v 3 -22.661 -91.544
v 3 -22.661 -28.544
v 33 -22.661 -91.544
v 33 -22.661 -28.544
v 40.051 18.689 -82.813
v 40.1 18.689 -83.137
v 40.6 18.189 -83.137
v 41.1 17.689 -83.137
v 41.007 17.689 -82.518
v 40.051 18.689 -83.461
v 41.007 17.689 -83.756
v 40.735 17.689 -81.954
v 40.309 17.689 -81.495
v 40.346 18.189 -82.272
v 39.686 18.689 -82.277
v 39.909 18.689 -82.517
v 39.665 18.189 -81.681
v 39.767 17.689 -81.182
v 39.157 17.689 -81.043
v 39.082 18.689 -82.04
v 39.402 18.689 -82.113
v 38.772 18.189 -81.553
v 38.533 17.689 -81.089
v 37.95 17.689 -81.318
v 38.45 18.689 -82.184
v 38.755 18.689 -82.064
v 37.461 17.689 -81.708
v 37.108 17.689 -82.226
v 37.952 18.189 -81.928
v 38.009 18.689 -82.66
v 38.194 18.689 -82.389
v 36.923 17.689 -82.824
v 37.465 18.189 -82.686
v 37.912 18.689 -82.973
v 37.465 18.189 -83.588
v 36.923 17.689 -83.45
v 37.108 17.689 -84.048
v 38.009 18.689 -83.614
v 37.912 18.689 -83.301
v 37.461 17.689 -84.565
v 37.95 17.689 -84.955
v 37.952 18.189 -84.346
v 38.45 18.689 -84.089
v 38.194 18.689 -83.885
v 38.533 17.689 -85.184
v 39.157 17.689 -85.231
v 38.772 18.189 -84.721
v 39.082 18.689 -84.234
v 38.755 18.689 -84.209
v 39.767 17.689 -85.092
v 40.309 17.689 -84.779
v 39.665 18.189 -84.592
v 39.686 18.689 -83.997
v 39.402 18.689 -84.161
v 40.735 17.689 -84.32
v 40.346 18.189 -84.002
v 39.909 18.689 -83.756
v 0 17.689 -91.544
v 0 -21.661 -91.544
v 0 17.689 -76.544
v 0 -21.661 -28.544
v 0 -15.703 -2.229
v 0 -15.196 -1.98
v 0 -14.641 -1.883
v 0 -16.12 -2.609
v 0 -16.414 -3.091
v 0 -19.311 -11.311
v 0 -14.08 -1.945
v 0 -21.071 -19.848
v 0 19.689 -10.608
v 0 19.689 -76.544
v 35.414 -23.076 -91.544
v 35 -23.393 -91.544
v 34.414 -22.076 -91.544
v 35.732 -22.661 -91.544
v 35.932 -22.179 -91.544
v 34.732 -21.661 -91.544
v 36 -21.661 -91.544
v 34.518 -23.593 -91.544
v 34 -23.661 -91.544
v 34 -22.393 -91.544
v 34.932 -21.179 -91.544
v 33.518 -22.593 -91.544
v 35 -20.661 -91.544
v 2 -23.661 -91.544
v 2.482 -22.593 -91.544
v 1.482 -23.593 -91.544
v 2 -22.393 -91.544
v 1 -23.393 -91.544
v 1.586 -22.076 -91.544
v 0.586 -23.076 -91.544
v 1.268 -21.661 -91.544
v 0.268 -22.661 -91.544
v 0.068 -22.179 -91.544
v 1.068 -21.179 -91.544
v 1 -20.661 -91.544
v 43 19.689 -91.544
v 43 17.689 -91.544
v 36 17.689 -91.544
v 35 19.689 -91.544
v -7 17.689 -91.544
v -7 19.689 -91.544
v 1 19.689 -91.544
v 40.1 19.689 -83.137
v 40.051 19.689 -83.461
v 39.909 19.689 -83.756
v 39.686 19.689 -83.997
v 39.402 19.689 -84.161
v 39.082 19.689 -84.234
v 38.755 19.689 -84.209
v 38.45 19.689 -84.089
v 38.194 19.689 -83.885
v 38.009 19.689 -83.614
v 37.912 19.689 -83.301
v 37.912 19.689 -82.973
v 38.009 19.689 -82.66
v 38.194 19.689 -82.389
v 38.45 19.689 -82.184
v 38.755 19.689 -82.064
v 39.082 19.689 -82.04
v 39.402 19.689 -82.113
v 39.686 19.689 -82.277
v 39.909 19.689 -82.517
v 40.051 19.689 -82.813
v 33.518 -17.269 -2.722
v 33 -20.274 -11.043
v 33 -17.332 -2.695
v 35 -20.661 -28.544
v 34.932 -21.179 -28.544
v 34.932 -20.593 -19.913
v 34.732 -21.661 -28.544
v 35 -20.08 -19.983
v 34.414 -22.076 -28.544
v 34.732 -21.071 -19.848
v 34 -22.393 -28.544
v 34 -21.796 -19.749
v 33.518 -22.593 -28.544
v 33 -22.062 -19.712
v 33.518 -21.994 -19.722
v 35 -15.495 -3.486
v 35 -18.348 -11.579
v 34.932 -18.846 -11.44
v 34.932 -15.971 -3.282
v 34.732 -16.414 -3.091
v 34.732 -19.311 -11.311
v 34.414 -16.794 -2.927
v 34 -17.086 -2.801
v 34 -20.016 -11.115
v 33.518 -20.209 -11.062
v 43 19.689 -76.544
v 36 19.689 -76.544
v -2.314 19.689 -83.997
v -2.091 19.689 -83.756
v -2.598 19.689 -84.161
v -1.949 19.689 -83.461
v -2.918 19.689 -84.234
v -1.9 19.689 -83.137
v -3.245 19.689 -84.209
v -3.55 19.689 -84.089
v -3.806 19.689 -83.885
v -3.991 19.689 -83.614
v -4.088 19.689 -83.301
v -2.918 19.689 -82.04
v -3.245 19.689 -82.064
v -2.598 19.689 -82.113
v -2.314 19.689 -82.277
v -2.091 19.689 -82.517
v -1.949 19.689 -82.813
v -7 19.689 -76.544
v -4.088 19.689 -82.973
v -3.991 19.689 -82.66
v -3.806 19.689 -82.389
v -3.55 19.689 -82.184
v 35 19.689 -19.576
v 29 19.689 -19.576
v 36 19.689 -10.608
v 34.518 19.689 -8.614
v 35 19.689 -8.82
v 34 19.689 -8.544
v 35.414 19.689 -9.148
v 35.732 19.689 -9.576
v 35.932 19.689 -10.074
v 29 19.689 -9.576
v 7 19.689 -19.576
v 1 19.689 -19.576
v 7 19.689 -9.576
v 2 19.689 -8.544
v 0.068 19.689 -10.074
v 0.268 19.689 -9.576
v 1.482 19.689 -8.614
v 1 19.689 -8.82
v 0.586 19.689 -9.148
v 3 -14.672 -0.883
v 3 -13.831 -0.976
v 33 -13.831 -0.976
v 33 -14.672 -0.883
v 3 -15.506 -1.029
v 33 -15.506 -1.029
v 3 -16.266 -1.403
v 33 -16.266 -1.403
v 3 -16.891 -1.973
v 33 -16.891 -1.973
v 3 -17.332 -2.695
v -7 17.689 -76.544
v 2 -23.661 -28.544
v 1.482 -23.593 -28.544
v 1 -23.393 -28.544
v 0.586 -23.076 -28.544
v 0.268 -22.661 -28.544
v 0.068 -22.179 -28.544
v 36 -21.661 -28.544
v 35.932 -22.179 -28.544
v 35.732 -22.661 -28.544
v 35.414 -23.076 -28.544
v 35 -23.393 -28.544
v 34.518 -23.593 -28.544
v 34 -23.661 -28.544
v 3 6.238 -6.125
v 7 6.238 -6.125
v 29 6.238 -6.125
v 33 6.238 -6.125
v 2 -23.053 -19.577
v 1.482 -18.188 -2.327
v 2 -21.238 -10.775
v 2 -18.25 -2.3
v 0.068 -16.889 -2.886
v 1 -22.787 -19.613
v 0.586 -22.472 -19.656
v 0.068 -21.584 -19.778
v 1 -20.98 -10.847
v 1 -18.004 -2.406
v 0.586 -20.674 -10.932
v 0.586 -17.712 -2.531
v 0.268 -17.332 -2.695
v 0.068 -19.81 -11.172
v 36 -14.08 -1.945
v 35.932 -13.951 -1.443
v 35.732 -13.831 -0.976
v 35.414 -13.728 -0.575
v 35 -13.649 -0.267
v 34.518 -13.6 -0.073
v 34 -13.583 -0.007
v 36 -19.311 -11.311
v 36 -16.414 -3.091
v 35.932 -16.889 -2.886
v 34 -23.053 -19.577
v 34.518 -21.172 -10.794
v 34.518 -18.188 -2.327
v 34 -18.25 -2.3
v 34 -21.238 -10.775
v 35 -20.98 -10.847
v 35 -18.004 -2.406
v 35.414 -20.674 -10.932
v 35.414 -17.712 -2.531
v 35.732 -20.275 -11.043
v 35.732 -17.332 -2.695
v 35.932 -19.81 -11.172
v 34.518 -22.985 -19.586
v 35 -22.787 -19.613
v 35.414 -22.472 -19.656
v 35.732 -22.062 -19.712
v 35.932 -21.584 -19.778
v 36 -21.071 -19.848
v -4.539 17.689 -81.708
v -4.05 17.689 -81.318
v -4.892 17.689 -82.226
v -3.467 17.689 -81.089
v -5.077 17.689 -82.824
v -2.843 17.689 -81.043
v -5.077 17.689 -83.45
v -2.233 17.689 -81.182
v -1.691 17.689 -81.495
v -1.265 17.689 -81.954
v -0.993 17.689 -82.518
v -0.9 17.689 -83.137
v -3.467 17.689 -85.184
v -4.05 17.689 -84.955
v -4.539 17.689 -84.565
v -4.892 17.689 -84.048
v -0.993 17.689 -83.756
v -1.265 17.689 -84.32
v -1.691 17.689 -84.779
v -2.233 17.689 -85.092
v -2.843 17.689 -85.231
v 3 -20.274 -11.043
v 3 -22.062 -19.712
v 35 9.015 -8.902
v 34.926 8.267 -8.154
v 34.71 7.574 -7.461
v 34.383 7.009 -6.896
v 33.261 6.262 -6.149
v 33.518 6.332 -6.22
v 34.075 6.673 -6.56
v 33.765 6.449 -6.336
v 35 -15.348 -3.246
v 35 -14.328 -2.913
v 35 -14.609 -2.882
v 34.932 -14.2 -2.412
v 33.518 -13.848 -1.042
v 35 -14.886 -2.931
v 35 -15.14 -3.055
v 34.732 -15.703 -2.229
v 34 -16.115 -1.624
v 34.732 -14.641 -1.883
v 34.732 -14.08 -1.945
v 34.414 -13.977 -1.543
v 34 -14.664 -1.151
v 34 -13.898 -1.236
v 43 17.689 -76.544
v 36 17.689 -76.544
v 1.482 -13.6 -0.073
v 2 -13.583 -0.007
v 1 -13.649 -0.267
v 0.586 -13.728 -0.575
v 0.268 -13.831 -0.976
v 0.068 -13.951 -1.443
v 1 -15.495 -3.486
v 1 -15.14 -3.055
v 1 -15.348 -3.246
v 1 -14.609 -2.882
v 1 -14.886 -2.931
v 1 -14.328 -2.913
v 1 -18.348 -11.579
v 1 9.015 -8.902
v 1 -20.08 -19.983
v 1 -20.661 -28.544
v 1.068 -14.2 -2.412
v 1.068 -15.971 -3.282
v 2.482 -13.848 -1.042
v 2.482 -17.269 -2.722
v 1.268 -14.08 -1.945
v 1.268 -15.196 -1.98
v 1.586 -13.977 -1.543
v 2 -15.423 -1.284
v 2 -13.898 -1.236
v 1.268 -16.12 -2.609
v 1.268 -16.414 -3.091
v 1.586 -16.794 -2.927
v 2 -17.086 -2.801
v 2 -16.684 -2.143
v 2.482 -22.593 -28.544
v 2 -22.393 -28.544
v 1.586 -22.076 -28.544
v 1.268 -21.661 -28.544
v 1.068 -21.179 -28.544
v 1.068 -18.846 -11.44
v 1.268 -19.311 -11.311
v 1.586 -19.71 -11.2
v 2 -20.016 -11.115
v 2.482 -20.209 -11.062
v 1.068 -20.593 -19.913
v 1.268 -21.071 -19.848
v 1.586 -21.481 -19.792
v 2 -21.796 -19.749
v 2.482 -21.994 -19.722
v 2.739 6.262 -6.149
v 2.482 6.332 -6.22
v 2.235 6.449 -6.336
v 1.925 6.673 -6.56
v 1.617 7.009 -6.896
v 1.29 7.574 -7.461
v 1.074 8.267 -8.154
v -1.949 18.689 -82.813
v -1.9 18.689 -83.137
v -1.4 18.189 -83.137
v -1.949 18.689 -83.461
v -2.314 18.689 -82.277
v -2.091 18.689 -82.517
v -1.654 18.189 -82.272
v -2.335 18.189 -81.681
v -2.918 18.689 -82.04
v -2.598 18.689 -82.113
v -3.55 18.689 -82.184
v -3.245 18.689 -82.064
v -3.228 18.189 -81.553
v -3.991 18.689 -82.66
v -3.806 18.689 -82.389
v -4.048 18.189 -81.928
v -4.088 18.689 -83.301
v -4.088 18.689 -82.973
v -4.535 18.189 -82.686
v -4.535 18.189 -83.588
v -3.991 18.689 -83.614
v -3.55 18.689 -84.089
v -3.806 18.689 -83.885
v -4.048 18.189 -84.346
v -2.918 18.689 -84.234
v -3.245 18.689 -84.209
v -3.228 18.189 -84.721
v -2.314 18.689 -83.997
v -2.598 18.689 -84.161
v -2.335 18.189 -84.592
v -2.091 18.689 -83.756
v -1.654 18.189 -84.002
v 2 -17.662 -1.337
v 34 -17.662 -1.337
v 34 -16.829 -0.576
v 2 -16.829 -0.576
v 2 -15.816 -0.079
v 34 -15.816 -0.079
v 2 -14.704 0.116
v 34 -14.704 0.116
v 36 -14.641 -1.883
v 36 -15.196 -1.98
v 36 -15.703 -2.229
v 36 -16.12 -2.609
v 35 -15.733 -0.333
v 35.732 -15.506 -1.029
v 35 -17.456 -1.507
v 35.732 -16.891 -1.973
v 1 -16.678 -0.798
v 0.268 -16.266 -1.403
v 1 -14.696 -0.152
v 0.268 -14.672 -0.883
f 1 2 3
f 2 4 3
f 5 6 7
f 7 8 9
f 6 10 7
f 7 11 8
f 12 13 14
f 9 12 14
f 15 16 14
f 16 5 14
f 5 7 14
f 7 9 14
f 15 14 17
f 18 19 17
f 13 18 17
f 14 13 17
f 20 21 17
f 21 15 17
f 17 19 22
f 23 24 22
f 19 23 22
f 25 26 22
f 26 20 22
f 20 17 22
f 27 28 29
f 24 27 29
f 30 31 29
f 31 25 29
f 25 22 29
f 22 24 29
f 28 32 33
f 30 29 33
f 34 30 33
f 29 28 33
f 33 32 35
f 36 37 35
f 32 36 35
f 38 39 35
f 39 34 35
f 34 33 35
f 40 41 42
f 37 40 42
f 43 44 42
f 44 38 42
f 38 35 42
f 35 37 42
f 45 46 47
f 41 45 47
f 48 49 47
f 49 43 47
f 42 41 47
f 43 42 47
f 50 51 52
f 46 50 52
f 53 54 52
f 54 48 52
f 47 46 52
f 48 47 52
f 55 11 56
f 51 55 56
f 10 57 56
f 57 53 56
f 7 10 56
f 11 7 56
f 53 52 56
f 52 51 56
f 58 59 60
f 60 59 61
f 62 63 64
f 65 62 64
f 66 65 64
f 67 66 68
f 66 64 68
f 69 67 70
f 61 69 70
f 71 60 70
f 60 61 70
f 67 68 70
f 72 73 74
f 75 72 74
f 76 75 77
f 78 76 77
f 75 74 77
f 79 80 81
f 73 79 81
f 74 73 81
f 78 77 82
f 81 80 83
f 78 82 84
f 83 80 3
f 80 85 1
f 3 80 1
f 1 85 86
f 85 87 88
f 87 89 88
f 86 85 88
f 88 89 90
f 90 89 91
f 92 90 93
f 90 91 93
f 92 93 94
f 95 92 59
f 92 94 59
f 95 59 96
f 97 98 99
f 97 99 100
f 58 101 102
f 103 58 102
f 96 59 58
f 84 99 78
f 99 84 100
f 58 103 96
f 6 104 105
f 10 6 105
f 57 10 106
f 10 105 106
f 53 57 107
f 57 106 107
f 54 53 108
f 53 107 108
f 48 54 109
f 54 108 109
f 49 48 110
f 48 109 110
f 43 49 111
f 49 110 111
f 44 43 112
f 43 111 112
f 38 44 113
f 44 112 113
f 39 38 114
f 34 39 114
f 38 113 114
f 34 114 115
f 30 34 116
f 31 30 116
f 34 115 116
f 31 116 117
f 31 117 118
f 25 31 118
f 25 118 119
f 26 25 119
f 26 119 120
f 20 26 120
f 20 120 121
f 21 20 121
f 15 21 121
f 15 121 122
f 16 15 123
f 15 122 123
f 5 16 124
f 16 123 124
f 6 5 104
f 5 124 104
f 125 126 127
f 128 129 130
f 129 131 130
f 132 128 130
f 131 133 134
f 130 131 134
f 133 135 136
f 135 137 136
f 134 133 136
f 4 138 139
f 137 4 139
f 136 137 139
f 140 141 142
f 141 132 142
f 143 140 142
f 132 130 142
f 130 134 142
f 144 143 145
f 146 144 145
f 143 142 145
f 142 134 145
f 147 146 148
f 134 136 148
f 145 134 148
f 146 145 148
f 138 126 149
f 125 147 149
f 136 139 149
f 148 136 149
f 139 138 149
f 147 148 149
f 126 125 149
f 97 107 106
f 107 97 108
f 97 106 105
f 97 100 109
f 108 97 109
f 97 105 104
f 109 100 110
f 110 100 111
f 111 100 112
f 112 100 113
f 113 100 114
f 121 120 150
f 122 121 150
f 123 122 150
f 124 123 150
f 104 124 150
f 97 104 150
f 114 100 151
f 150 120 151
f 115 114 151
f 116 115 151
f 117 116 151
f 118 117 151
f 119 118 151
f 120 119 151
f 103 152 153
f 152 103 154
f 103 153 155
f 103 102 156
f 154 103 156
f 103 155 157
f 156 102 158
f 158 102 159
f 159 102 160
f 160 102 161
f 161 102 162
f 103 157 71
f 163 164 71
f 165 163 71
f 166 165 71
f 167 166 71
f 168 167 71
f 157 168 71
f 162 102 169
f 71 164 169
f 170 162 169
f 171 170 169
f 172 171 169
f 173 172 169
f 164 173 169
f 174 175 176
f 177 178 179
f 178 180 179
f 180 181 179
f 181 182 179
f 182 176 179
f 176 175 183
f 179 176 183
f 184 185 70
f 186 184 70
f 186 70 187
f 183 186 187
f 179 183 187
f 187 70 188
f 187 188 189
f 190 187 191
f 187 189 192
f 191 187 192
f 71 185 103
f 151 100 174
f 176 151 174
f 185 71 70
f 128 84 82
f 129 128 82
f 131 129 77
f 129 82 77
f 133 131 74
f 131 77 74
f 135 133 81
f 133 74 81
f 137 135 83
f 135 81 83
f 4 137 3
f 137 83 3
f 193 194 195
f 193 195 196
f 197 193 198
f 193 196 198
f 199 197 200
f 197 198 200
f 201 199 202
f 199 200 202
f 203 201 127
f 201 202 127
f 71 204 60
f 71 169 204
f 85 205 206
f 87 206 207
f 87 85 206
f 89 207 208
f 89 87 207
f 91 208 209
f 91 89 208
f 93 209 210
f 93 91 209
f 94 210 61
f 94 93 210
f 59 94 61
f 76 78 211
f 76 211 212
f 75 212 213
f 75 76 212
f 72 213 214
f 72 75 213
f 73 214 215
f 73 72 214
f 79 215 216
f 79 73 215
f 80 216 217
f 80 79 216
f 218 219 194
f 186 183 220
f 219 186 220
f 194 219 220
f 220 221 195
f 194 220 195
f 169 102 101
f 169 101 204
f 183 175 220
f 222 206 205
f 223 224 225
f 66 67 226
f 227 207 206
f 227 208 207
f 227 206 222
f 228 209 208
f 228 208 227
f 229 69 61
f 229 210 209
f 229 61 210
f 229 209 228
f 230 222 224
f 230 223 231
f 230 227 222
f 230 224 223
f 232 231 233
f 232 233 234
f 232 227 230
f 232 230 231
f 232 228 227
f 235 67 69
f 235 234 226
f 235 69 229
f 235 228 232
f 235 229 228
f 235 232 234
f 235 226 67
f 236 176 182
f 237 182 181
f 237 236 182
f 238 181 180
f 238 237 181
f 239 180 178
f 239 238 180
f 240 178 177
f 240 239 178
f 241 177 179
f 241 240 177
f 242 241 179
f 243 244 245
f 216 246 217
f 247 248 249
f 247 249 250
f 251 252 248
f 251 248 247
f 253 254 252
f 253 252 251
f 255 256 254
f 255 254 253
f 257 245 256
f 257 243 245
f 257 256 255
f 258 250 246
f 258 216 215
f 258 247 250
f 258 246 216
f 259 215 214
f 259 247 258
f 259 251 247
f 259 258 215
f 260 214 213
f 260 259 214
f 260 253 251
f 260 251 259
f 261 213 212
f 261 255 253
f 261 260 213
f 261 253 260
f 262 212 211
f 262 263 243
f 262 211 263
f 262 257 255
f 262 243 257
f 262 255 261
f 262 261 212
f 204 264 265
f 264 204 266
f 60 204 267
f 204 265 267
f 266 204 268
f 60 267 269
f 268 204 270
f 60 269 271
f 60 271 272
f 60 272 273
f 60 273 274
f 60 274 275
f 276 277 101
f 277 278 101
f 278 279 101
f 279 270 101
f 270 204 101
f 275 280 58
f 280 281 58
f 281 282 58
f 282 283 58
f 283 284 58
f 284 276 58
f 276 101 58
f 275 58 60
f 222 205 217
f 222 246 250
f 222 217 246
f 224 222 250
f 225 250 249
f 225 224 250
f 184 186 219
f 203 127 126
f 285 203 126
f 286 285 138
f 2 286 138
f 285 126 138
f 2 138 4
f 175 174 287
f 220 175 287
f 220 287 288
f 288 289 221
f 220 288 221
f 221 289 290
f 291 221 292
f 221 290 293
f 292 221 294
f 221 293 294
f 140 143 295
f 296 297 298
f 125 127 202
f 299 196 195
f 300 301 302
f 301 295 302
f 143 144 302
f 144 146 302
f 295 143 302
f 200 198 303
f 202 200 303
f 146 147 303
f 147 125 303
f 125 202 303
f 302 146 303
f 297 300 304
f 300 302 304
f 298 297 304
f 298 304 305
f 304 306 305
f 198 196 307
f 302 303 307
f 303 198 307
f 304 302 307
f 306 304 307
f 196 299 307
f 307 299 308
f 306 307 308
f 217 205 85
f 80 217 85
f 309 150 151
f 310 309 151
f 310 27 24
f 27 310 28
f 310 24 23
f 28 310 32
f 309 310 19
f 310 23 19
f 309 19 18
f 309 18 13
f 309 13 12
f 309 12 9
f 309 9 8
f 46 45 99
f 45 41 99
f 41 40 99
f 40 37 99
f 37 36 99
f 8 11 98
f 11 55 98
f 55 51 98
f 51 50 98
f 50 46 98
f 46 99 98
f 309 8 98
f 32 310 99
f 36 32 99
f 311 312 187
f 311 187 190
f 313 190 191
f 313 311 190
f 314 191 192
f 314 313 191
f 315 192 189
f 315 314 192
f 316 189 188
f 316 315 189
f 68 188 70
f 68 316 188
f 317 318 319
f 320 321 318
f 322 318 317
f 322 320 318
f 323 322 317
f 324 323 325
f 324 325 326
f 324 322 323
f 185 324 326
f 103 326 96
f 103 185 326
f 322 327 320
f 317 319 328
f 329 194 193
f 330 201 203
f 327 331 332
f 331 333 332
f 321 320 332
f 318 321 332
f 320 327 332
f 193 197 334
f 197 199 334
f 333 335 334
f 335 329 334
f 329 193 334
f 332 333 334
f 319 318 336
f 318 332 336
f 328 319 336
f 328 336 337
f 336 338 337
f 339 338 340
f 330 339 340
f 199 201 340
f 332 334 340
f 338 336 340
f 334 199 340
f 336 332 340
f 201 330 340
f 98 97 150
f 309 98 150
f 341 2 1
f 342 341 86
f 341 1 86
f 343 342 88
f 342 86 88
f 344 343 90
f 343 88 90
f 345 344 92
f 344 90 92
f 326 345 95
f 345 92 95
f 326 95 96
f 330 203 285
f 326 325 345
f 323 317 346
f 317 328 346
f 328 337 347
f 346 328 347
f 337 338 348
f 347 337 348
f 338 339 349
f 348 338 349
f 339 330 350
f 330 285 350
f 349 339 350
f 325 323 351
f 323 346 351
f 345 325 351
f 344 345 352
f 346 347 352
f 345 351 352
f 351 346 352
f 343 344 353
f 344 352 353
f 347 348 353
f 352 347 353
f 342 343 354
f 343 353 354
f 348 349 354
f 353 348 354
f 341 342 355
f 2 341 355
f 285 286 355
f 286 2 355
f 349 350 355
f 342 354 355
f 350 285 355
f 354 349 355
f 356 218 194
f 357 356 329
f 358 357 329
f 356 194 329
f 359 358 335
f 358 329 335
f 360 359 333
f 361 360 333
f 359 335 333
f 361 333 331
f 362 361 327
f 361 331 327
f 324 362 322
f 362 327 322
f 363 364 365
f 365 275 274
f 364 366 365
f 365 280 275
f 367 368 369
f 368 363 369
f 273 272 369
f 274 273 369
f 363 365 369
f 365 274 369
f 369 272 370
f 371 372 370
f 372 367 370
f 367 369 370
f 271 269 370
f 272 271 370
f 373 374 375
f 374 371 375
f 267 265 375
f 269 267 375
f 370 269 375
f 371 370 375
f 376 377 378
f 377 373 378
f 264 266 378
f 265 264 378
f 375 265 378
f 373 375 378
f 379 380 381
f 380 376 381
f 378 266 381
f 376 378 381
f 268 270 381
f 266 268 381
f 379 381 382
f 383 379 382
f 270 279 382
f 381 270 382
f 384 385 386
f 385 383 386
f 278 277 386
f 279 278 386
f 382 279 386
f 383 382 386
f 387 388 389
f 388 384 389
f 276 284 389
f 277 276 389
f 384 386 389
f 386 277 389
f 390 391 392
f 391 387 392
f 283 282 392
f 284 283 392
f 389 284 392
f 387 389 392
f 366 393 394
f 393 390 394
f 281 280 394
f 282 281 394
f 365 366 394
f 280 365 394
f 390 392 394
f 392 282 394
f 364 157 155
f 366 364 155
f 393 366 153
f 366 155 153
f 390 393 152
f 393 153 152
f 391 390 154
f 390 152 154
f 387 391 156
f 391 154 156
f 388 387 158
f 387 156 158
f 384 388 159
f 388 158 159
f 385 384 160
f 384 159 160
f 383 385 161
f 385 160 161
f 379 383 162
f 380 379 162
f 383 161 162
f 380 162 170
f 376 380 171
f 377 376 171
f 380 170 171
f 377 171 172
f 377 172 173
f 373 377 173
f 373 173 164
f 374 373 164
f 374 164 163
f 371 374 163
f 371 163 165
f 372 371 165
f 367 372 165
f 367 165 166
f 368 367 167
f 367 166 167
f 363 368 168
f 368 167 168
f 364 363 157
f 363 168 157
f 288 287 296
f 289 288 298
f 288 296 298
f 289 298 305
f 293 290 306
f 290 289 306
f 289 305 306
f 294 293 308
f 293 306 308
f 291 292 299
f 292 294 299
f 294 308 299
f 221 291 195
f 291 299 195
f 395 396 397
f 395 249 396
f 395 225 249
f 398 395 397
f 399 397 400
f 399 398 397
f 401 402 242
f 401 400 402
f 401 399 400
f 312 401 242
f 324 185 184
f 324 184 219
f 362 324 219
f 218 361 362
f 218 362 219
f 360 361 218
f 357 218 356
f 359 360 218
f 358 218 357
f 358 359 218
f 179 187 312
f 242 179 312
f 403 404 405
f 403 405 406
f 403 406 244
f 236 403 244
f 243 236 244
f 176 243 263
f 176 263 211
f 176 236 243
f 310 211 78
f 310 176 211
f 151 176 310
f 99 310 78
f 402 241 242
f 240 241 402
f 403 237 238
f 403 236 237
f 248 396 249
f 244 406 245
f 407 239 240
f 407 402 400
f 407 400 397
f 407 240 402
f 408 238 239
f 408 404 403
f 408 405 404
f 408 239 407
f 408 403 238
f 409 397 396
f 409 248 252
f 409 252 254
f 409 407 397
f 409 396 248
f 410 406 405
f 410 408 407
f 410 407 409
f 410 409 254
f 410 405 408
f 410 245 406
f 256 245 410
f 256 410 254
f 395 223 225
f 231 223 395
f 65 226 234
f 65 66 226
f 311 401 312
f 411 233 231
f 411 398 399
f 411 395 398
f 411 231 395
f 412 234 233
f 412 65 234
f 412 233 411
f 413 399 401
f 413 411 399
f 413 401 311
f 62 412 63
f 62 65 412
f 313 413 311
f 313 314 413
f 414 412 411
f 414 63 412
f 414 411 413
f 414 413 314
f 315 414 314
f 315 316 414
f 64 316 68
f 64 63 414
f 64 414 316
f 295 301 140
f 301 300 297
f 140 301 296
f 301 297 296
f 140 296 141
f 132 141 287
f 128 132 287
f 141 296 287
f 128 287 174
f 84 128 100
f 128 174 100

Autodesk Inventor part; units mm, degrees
ref_plane "YZ Plane" through (0, 0, 0) normal (1, 0, 0) x (0, 1, 0)
ref_plane "XZ Plane" through (0, 0, 0) normal (0, 1, 0) x (-1, 0, 0)
ref_plane "XY Plane" through (0, 0, 0) normal (0, 0, 1) x (1, 0, 0)
sketch "Skizze1" plane through (0, 0, 0) normal (1, 0, 0) x (0, 1, 0)
  line L0 (19.6888, -8.5435) -> (-13.5827, -0.0073)
  arc A0 (-13.5827, -0.0073) -> (-18.2505, -2.2997) centre (-14.5767, -3.8818) ccw
  arc A1 (-18.2505, -2.2997) -> (-23.6613, -28.5435) centre (42.6888, -28.5435) ccw
  line L1 (-23.6613, -28.5435) -> (-23.6613, -91.5435)
  line L2 (-23.6613, -91.5435) -> (19.6888, -91.5435)
  line L3 (19.6888, -91.5435) -> (19.6888, -8.5435)
  circle A2 centre (42.6888, -28.5435) radius 1.621 projected
  arc A3 (-14.3179, -2.9159) -> (-15.3279, -4.5419) centre (-14.5767, -3.8818) ccw projected
  line L4 (19.6888, -8.5435) -> (19.6888, -44.2151) projected
  line L5 (-23.6613, -28.5435) -> (42.6888, -28.5435) construction
  dimension "d3" = 83
  dimension "d4" = 3
extrude "Extrusion1" add sketch "Skizze1" along normal blind 35 contours L3 L2 L1 A1 A0 L0
sketch "Skizze2" plane through (35, 0, 0) normal (1, 0, 0) x (0, 0, -1)
  line L0 (8.5435, 19.6888) -> (9.5759, 19.6888)
  line L1 (9.5759, 19.6888) -> (0.976, -13.8312)
  arc A0 (0.976, -13.8312) -> (2.6952, -17.332) centre (3.8818, -14.5767) ccw
  arc A1 (2.6952, -17.332) -> (28.5435, -22.6613) centre (28.5435, 42.6888) ccw
  line L2 (28.5435, -22.6613) -> (91.5435, -22.6613)
  line L3 (91.5435, 19.6888) -> (8.5435, 19.6888) projected
  line L4 (91.5435, -23.6613) -> (91.5435, 19.6888) projected
  line L5 (28.5435, -23.6613) -> (91.5435, -23.6613) projected
  arc A2 (2.2997, -18.2505) -> (28.5435, -23.6613) centre (28.5435, 42.6888) ccw projected
  arc A3 (0.0073, -13.5827) -> (2.2997, -18.2505) centre (3.8818, -14.5767) ccw projected
  line L6 (8.5435, 19.6888) -> (0.0073, -13.5827) projected
  point P0 (0, 0)
extrude "Extrusion2" cut sketch "Skizze2" against normal blind 34 contours L3 L4 L2 A1 A0 L1
sketch "Skizze3" plane through (35, 0, 0) normal (1, 0, 0) x (0, 0, -1)
  line L0 (91.5435, 19.6888) -> (8.5435, 19.6888) projected
  line L1 (91.5435, -23.6613) -> (91.5435, 19.6888) projected
  line L2 (28.5435, -23.6613) -> (91.5435, -23.6613) projected
  arc A0 (2.2997, -18.2505) -> (28.5435, -23.6613) centre (28.5435, 42.6888) ccw projected
  arc A1 (0.0073, -13.5827) -> (2.2997, -18.2505) centre (3.8818, -14.5767) ccw projected
  line L3 (8.5435, 19.6888) -> (0.0073, -13.5827) projected
  point P0 (0, 0)
extrude "Extrusion3" add sketch "Skizze3" along normal blind 1
sketch "Skizze6" plane through (1, 0, 0) normal (1, 0, 0) x (0, 0, -1)
  line L0 (9.5759, 19.6888) -> (91.5435, 19.6888) projected
  line L1 (9.5759, 19.6888) -> (19.5759, 19.6888)
  line L2 (19.5759, 19.6888) -> (6.1249, 6.2378)
  line L3 (0.976, -13.8312) -> (9.5759, 19.6888) projected
  point P0 (0, 0)
  dimension "d40" = 10
  dimension "d41" = 45
fillet "Rundung1" radius 2 16 edges at (36, -23.6613, -60.0435) (36, -16.34, -0.2914) (36, 3.0531, -4.2754) (36, -22.2945, -15.1456) (0, -23.6613, -60.0435) (0, -16.34, -0.2914) (0, 3.0531, -4.2754) (0, -22.2945, -15.1456) (1, -21.3151, -15.3475) (1, -15.8991, -1.189) (1, 2.9288, -5.2759) (1, -22.6613, -60.0435) (35, -21.3151, -15.3475) (35, -15.8991, -1.189) (35, 2.9288, -5.2759) (35, -22.6613, -60.0435)
sketch "Skizze4" plane through (0, 19.6888, -10.6083) normal (0, 1, 0) x (1, 0, 0)
  line L0 (0, 80.9352) -> (0, 0) projected
  line L1 (0, 80.9352) -> (-7, 80.9352)
  line L2 (-7, 80.9352) -> (-7, 65.9352)
  line L3 (-7, 65.9352) -> (0, 65.9352)
  line L4 (0, 65.9352) -> (0, 80.9352)
  circle A0 centre (-3, 72.5285) radius 0.7835 projected
  line L5 (36, 80.9352) -> (36, 0) projected
  line L6 (36, 80.9352) -> (43, 80.9352)
  line L7 (43, 80.9352) -> (43, 65.9352)
  line L8 (43, 65.9352) -> (36, 65.9352)
  line L9 (36, 65.9352) -> (36, 80.9352)
  circle A1 centre (39, 72.5285) radius 0.7835 projected
  circle A2 centre (-3, 72.5285) radius 1.1
  circle A3 centre (39, 72.5285) radius 1.1
  point P0 (0, -10.6083)
  point P1 (2, 65.9352)
  point P2 (0, -2.0648)
  point P3 (2, -1.0324)
  point P4 (36, 65.9352)
  point P5 (36, 2.9352)
  dimension "d17" = 7
  dimension "d18" = 15
  dimension "d19" = 7
  dimension "d20" = 15
  dimension "d21" = 2.2
  dimension "d22" = 2.2
extrude "Extrusion4" add sketch "Skizze4" against normal blind 2 contours L0 L3 L2 L1 | L6 L7 L8 L5
chamfer "Fasen1" distance 1 angle 45 1 edges at (-4.1, 17.6888, -83.1368)
chamfer "Fasen2" distance 1 angle 45 1 edges at (37.9, 17.6888, -83.1368)
extrude "Extrusion7" add sketch "Skizze6" along normal blind 6
sketch "Skizze8" plane through (35, 0, 0) normal (-1, 0, 0) x (0, 0, 1)
  line L0 (-9.5759, 19.6888) -> (-19.5759, 19.6888)
  line L1 (-91.5435, 19.6888) -> (-8.5435, 19.6888) projected
  line L2 (-19.5759, 19.6888) -> (-6.1249, 6.2378)
  line L3 (-0.976, -13.8312) -> (-9.5759, 19.6888) projected
  point P0 (0, 0)
  dimension "d44" = 10
  dimension "d45" = 45
extrude "Extrusion8" add sketch "Skizze8" along normal blind 6
properties part number "verkleidungBremse" material "PC/ABS-Kunststoff, 3DDruck, PLA"
